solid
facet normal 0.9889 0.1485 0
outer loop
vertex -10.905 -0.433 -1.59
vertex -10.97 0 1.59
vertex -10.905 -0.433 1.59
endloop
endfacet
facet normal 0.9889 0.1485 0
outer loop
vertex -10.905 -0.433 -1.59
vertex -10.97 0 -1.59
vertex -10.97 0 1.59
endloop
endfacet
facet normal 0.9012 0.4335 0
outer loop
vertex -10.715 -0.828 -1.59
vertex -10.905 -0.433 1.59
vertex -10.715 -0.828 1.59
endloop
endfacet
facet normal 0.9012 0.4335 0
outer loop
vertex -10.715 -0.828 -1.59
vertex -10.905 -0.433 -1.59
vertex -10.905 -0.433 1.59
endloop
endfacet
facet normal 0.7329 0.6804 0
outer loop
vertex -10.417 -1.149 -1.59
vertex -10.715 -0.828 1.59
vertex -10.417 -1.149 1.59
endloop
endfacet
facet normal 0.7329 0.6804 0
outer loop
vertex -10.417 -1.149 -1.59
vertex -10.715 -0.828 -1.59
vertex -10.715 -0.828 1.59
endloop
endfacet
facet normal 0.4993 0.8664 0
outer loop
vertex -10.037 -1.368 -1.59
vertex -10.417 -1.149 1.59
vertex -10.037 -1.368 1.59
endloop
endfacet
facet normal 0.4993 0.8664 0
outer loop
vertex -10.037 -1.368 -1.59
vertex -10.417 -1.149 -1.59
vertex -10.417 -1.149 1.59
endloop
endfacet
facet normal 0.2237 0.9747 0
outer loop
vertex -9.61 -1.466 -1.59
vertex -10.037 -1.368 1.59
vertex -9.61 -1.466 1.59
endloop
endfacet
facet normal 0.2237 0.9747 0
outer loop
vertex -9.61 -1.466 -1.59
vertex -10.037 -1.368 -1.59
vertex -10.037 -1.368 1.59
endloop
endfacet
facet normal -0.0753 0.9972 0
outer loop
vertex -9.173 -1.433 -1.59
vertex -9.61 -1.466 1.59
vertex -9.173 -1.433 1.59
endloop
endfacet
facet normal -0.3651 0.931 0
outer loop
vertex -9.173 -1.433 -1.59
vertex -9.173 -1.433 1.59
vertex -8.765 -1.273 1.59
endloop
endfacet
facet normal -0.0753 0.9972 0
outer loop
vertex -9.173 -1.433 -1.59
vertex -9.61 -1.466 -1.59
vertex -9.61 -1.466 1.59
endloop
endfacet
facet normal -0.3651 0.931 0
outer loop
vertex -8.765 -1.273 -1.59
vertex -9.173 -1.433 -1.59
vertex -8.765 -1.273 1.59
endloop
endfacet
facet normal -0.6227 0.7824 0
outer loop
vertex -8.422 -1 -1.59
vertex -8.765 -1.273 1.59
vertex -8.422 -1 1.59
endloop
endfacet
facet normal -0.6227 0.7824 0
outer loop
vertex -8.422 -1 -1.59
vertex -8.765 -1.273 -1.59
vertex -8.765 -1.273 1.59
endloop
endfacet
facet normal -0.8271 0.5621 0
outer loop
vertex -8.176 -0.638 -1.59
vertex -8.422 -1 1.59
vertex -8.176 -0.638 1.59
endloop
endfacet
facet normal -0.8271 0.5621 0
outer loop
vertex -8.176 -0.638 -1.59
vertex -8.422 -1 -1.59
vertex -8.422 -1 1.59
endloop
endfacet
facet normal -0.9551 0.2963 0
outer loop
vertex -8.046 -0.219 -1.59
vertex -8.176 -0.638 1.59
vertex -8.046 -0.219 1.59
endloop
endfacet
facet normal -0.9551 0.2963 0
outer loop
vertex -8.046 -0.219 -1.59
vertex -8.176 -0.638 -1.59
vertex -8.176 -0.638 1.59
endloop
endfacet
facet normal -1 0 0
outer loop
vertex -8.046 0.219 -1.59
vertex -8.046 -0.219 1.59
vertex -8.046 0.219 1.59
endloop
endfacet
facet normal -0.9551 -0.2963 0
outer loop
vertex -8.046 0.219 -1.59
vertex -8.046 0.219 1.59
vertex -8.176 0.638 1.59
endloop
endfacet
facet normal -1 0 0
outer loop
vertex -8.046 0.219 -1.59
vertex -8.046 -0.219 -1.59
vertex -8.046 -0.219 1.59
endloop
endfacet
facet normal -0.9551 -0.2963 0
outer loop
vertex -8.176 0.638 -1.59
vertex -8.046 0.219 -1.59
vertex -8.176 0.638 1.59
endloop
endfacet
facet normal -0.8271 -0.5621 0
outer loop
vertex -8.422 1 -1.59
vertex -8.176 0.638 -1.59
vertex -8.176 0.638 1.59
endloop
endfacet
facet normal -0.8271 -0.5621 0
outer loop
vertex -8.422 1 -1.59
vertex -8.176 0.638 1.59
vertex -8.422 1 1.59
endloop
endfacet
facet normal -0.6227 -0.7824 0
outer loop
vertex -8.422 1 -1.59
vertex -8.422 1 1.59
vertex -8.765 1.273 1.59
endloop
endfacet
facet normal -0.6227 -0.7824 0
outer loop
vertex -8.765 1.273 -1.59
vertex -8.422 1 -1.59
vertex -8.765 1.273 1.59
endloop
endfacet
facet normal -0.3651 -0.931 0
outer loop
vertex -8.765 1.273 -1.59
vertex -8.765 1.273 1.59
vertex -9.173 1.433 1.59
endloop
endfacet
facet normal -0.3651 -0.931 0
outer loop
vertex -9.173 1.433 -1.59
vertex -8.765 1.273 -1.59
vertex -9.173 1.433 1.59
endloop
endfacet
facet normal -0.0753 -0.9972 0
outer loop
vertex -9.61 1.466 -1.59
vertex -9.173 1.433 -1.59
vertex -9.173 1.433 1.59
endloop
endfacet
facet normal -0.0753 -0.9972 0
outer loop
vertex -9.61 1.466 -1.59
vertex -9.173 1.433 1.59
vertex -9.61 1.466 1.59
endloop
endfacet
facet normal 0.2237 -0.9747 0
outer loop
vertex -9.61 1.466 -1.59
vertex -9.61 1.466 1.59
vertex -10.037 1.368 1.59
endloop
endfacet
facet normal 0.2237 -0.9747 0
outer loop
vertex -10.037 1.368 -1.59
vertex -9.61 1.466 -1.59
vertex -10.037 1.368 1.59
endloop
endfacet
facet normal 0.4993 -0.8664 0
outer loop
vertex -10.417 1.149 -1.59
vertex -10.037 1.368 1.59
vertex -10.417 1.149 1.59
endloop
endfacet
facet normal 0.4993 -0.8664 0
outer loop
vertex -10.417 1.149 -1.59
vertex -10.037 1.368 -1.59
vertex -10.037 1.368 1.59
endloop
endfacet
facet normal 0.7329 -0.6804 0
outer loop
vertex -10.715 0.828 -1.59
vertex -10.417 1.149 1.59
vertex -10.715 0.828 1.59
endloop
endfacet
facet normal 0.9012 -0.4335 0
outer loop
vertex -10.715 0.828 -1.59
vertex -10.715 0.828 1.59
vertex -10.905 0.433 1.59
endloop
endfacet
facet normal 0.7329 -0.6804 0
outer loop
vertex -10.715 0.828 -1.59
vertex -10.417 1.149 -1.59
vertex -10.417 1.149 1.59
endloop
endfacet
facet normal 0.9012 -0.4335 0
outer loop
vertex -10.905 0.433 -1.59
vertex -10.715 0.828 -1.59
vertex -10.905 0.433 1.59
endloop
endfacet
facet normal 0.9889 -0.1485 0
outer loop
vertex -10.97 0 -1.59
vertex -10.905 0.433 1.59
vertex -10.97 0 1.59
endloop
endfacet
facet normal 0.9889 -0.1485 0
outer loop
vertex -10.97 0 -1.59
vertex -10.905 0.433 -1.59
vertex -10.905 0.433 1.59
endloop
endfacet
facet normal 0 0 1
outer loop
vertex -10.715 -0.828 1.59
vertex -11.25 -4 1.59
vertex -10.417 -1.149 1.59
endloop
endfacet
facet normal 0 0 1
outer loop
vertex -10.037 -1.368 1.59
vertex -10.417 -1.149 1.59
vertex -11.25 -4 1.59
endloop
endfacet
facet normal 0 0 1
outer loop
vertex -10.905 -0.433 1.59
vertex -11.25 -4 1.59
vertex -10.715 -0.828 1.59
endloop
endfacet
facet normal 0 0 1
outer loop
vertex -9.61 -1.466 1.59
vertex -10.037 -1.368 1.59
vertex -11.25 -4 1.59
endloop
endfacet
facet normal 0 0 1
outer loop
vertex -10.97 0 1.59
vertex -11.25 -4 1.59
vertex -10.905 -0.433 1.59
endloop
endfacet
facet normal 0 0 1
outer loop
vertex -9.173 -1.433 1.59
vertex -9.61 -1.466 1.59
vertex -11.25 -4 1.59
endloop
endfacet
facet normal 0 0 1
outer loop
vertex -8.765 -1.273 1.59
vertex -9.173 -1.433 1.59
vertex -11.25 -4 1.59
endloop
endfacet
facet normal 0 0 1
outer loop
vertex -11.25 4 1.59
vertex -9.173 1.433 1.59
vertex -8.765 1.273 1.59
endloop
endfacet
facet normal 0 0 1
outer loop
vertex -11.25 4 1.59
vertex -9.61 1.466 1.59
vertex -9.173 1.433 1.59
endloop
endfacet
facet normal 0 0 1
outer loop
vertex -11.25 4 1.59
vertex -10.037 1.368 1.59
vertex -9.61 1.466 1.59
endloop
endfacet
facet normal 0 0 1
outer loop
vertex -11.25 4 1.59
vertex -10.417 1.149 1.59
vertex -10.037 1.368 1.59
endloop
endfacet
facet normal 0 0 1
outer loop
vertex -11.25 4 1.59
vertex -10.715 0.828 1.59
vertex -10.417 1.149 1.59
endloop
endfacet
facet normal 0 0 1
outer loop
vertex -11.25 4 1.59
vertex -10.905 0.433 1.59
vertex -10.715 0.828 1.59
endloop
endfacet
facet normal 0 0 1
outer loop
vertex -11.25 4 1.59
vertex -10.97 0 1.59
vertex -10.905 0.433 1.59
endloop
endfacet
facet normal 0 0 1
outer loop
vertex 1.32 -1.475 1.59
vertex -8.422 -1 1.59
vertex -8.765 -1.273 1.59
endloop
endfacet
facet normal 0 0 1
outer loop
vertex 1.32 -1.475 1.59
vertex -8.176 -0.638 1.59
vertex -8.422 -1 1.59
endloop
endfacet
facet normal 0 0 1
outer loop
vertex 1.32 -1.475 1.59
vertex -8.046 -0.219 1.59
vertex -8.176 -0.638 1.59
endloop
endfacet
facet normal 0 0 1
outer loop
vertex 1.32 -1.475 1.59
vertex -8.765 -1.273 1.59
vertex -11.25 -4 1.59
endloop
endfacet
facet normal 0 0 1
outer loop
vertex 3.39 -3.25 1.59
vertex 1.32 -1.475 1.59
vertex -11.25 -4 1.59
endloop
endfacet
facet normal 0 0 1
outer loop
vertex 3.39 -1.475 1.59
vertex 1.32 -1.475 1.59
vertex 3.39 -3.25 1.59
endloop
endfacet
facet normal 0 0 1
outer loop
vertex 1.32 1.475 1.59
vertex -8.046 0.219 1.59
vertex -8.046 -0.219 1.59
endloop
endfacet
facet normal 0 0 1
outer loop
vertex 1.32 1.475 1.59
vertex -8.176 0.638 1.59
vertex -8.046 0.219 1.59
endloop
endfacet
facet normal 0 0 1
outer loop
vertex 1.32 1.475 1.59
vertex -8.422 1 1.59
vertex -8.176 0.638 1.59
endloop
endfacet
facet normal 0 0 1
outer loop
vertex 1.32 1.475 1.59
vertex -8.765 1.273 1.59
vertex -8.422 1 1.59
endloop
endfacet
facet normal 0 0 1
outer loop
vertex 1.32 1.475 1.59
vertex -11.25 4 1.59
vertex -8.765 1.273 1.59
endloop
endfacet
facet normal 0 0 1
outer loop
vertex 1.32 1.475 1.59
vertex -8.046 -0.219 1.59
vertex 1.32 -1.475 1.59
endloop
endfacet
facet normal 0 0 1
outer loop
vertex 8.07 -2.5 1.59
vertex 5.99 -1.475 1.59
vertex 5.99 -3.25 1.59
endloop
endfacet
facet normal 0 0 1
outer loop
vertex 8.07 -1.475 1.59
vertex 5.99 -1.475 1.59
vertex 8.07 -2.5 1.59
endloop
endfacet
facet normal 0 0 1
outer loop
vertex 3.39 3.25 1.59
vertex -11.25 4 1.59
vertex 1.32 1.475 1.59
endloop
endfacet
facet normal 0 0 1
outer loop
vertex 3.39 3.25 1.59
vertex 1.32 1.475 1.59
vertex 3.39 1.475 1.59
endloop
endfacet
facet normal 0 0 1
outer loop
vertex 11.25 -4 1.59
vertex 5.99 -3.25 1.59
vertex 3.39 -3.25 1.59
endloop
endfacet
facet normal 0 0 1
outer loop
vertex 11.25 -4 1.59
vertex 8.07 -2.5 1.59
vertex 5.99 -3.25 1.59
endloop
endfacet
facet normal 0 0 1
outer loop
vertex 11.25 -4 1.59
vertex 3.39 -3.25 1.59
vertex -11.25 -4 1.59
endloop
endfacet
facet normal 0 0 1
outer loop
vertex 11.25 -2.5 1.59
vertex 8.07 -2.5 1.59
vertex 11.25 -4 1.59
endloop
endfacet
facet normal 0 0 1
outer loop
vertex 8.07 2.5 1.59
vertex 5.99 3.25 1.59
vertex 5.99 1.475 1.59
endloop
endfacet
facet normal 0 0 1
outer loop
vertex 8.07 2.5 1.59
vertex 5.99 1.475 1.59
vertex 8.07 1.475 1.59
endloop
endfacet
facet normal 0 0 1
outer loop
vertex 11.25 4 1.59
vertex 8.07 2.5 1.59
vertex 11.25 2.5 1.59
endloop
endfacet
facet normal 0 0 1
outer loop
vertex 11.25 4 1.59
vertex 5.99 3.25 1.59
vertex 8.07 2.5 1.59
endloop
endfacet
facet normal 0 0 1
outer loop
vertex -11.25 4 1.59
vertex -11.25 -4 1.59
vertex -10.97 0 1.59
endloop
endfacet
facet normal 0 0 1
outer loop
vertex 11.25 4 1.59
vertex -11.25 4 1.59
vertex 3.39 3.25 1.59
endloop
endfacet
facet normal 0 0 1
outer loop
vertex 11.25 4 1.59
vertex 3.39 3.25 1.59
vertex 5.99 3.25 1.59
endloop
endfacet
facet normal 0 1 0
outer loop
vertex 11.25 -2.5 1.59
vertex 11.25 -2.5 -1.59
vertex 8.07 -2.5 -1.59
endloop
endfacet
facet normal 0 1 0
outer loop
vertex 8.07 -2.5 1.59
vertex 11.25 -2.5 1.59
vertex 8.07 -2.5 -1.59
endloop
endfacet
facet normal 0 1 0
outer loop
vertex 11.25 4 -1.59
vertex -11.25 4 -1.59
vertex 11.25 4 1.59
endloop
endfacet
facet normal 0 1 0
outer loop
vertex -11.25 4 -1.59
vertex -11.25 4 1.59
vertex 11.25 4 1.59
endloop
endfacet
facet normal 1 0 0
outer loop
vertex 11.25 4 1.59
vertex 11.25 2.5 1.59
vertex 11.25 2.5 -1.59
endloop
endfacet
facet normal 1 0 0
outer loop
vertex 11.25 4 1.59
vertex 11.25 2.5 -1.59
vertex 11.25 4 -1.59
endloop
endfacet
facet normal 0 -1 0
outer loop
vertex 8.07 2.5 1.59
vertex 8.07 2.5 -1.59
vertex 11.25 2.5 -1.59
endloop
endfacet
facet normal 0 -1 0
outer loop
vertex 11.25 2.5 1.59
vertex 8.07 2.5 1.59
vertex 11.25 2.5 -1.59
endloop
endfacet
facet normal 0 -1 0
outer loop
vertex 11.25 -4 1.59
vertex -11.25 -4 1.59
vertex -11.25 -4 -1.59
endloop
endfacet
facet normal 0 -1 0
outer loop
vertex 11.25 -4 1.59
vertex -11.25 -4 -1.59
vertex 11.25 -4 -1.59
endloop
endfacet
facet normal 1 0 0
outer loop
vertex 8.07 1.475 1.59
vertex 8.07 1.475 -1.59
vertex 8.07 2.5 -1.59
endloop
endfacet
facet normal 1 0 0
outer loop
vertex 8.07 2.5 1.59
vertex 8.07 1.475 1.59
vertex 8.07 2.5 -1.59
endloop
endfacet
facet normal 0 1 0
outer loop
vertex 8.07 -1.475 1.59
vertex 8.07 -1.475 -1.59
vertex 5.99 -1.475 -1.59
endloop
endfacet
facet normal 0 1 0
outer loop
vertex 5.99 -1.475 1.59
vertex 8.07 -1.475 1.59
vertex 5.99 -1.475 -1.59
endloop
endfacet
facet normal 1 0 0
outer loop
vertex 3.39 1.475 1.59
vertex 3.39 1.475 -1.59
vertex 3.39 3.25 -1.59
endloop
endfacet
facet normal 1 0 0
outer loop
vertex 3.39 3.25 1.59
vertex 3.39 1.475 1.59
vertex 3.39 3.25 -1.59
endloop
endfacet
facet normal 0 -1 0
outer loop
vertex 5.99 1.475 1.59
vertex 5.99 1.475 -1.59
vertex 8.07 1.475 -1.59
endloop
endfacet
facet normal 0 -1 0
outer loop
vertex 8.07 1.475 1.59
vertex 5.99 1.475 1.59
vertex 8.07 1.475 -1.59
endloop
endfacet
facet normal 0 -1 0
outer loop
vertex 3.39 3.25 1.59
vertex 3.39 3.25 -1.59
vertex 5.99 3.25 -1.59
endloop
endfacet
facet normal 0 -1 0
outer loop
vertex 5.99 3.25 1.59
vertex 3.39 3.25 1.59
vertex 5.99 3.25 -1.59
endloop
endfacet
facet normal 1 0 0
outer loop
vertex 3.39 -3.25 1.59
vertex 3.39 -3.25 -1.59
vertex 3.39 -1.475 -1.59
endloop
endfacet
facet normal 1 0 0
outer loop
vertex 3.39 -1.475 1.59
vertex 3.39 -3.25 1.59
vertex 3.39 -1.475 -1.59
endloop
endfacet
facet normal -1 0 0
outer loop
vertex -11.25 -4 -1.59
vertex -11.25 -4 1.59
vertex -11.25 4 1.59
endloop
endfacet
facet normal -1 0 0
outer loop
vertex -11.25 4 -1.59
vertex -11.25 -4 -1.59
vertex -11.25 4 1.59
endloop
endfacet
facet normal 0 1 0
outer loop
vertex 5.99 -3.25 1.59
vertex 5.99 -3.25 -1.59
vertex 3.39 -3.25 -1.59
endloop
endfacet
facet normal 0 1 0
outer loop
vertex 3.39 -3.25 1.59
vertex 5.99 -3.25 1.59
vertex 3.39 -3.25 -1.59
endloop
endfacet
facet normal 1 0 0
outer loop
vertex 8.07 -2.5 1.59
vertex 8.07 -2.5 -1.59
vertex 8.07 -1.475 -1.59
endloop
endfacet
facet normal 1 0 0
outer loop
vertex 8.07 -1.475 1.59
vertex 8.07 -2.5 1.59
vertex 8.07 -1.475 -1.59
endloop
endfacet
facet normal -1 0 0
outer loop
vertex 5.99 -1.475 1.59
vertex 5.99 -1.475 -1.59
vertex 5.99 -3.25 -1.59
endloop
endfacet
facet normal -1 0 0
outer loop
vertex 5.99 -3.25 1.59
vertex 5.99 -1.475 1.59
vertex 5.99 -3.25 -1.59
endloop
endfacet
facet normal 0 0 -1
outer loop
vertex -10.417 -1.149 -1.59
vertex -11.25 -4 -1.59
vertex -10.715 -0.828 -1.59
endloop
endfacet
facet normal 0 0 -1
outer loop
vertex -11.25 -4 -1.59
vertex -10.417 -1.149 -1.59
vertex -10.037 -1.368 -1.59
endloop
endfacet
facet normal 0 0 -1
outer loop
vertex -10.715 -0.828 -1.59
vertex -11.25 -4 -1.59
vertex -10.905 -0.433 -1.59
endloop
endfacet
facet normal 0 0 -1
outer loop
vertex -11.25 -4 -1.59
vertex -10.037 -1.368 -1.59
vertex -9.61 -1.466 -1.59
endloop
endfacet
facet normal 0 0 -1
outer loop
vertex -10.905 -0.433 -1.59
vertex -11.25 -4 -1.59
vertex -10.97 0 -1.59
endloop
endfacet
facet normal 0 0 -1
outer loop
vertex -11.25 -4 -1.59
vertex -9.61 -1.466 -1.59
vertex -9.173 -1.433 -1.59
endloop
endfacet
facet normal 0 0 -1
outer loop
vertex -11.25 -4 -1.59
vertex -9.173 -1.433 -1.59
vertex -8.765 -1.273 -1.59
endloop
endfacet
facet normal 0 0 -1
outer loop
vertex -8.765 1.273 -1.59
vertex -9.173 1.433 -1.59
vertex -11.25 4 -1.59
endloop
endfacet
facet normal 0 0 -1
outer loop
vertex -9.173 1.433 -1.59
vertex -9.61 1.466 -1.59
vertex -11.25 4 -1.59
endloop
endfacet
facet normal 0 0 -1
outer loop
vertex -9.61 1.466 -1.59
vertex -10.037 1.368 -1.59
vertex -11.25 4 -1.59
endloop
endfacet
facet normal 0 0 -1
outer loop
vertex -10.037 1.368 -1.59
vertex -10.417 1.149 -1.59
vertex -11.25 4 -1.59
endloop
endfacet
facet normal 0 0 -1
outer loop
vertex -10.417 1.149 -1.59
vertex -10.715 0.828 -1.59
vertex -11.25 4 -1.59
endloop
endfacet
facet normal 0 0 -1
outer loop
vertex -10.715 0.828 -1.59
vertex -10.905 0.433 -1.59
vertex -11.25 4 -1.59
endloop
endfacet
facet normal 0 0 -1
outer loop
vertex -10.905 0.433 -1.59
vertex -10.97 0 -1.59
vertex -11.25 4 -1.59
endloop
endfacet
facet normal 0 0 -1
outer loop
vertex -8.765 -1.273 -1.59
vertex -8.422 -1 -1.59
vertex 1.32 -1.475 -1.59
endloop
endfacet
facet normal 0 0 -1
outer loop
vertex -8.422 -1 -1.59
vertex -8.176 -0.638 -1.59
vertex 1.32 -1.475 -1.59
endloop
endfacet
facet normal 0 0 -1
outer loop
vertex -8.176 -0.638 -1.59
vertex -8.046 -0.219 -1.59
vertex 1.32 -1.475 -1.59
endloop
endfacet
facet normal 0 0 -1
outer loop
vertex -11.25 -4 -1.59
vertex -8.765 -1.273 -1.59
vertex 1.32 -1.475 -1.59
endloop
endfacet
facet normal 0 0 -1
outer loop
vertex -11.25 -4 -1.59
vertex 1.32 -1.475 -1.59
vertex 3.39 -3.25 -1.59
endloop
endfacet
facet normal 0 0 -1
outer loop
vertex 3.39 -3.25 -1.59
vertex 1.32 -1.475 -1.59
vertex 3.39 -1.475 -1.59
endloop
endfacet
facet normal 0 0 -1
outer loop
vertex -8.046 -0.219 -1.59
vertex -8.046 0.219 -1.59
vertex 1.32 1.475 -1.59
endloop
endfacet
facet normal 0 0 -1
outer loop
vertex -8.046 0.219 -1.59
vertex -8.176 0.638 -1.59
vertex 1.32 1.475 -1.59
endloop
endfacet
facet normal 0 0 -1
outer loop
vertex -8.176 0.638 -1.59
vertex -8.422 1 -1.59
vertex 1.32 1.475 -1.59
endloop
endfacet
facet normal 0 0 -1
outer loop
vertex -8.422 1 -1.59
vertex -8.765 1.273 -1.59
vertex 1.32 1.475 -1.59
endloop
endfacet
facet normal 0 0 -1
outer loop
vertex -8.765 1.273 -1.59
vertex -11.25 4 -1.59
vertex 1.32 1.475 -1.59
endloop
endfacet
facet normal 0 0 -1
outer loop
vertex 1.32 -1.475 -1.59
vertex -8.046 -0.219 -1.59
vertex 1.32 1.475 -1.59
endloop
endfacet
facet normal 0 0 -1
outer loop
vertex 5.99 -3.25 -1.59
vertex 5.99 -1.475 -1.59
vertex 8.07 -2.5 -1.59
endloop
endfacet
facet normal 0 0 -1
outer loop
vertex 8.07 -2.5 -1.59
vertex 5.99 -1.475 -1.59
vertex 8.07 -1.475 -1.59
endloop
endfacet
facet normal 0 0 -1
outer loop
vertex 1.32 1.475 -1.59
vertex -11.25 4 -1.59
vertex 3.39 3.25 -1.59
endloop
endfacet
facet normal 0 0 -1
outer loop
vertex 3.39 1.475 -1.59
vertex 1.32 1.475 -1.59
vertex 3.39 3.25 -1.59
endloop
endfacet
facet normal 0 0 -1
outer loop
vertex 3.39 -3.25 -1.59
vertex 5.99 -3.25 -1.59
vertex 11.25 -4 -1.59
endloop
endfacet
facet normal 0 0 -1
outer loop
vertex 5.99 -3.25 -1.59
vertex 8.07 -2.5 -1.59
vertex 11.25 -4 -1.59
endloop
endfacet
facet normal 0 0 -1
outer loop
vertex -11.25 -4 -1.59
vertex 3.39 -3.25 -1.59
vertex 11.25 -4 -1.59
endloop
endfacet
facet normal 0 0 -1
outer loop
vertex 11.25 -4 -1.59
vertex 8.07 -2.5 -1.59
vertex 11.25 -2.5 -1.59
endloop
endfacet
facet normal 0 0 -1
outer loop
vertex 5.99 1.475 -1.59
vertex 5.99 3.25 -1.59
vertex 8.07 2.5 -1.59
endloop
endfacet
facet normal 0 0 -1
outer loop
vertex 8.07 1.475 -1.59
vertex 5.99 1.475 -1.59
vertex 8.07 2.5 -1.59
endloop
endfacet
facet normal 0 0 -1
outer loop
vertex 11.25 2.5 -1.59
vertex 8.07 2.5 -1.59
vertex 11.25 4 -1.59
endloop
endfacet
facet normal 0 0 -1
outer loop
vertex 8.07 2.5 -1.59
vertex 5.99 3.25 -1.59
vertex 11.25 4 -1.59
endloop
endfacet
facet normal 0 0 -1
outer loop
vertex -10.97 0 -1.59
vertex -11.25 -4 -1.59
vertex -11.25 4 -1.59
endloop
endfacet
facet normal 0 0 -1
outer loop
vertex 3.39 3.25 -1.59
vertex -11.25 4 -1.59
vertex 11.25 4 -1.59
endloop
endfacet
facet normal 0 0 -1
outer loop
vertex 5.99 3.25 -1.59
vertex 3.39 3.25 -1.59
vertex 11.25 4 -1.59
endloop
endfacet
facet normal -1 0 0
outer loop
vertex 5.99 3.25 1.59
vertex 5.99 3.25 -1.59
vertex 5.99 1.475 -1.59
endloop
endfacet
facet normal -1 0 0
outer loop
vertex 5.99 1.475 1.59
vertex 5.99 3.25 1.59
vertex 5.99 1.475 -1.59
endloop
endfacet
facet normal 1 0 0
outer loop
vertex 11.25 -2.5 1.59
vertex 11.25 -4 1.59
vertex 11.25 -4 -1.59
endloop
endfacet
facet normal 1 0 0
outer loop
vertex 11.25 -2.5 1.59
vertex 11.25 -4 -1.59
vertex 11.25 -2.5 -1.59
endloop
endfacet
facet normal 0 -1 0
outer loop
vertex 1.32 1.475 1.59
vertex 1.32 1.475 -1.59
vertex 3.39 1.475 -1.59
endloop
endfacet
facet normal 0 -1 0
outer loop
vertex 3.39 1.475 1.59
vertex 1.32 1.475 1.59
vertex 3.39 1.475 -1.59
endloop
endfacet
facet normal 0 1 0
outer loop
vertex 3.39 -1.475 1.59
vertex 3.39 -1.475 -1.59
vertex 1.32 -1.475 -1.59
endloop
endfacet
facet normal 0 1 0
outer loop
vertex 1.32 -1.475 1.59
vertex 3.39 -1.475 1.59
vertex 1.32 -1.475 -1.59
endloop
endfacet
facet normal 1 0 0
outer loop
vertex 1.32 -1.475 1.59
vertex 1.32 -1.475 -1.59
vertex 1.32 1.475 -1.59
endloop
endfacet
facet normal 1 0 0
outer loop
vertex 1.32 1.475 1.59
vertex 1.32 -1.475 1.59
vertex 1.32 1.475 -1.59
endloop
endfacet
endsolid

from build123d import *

# Parameters (mm, degrees)
SKETCH1_W           = 22.5
SKETCH1_H           = 8
SKETCH1_R           = 1.47
BOSS_EXTRUDE1_DEPTH = 1.59
CUT_EXTRUDE1_DEPTH  = 13.3561685


with BuildPart() as part:
    # Sketch1 → Boss-Extrude1 (new, symmetric)
    with BuildSketch(Plane.XY):
        Rectangle(SKETCH1_W, SKETCH1_H)
        with Locations(Location((-9.5, 0, 0), (0, 0, 180))):
            Circle(SKETCH1_R, mode=Mode.SUBTRACT)
    extrude(amount=BOSS_EXTRUDE1_DEPTH, both=True)

    # Sketch2 → Cut-Extrude1 (cut, through all)
    with BuildSketch(Plane(origin=(0, 0, -1.59), x_dir=(-1, 0, 0), z_dir=(0, 0, -1))):
        Polygon((-3.39, -1.475), (-1.32, -1.475), (-1.32, 1.475), (-3.39, 1.475), (-3.39, 3.25), (-5.99, 3.25), (-5.99, 1.475), (-8.07, 1.475), (-8.07, 2.5), (-11.25, 2.5), (-11.25, -2.5), (-8.07, -2.5), (-8.07, -1.475), (-5.99, -1.475), (-5.99, -3.25), (-3.39, -3.25), align=None)
    extrude(amount=-CUT_EXTRUDE1_DEPTH, mode=Mode.SUBTRACT)


solid = part.part
